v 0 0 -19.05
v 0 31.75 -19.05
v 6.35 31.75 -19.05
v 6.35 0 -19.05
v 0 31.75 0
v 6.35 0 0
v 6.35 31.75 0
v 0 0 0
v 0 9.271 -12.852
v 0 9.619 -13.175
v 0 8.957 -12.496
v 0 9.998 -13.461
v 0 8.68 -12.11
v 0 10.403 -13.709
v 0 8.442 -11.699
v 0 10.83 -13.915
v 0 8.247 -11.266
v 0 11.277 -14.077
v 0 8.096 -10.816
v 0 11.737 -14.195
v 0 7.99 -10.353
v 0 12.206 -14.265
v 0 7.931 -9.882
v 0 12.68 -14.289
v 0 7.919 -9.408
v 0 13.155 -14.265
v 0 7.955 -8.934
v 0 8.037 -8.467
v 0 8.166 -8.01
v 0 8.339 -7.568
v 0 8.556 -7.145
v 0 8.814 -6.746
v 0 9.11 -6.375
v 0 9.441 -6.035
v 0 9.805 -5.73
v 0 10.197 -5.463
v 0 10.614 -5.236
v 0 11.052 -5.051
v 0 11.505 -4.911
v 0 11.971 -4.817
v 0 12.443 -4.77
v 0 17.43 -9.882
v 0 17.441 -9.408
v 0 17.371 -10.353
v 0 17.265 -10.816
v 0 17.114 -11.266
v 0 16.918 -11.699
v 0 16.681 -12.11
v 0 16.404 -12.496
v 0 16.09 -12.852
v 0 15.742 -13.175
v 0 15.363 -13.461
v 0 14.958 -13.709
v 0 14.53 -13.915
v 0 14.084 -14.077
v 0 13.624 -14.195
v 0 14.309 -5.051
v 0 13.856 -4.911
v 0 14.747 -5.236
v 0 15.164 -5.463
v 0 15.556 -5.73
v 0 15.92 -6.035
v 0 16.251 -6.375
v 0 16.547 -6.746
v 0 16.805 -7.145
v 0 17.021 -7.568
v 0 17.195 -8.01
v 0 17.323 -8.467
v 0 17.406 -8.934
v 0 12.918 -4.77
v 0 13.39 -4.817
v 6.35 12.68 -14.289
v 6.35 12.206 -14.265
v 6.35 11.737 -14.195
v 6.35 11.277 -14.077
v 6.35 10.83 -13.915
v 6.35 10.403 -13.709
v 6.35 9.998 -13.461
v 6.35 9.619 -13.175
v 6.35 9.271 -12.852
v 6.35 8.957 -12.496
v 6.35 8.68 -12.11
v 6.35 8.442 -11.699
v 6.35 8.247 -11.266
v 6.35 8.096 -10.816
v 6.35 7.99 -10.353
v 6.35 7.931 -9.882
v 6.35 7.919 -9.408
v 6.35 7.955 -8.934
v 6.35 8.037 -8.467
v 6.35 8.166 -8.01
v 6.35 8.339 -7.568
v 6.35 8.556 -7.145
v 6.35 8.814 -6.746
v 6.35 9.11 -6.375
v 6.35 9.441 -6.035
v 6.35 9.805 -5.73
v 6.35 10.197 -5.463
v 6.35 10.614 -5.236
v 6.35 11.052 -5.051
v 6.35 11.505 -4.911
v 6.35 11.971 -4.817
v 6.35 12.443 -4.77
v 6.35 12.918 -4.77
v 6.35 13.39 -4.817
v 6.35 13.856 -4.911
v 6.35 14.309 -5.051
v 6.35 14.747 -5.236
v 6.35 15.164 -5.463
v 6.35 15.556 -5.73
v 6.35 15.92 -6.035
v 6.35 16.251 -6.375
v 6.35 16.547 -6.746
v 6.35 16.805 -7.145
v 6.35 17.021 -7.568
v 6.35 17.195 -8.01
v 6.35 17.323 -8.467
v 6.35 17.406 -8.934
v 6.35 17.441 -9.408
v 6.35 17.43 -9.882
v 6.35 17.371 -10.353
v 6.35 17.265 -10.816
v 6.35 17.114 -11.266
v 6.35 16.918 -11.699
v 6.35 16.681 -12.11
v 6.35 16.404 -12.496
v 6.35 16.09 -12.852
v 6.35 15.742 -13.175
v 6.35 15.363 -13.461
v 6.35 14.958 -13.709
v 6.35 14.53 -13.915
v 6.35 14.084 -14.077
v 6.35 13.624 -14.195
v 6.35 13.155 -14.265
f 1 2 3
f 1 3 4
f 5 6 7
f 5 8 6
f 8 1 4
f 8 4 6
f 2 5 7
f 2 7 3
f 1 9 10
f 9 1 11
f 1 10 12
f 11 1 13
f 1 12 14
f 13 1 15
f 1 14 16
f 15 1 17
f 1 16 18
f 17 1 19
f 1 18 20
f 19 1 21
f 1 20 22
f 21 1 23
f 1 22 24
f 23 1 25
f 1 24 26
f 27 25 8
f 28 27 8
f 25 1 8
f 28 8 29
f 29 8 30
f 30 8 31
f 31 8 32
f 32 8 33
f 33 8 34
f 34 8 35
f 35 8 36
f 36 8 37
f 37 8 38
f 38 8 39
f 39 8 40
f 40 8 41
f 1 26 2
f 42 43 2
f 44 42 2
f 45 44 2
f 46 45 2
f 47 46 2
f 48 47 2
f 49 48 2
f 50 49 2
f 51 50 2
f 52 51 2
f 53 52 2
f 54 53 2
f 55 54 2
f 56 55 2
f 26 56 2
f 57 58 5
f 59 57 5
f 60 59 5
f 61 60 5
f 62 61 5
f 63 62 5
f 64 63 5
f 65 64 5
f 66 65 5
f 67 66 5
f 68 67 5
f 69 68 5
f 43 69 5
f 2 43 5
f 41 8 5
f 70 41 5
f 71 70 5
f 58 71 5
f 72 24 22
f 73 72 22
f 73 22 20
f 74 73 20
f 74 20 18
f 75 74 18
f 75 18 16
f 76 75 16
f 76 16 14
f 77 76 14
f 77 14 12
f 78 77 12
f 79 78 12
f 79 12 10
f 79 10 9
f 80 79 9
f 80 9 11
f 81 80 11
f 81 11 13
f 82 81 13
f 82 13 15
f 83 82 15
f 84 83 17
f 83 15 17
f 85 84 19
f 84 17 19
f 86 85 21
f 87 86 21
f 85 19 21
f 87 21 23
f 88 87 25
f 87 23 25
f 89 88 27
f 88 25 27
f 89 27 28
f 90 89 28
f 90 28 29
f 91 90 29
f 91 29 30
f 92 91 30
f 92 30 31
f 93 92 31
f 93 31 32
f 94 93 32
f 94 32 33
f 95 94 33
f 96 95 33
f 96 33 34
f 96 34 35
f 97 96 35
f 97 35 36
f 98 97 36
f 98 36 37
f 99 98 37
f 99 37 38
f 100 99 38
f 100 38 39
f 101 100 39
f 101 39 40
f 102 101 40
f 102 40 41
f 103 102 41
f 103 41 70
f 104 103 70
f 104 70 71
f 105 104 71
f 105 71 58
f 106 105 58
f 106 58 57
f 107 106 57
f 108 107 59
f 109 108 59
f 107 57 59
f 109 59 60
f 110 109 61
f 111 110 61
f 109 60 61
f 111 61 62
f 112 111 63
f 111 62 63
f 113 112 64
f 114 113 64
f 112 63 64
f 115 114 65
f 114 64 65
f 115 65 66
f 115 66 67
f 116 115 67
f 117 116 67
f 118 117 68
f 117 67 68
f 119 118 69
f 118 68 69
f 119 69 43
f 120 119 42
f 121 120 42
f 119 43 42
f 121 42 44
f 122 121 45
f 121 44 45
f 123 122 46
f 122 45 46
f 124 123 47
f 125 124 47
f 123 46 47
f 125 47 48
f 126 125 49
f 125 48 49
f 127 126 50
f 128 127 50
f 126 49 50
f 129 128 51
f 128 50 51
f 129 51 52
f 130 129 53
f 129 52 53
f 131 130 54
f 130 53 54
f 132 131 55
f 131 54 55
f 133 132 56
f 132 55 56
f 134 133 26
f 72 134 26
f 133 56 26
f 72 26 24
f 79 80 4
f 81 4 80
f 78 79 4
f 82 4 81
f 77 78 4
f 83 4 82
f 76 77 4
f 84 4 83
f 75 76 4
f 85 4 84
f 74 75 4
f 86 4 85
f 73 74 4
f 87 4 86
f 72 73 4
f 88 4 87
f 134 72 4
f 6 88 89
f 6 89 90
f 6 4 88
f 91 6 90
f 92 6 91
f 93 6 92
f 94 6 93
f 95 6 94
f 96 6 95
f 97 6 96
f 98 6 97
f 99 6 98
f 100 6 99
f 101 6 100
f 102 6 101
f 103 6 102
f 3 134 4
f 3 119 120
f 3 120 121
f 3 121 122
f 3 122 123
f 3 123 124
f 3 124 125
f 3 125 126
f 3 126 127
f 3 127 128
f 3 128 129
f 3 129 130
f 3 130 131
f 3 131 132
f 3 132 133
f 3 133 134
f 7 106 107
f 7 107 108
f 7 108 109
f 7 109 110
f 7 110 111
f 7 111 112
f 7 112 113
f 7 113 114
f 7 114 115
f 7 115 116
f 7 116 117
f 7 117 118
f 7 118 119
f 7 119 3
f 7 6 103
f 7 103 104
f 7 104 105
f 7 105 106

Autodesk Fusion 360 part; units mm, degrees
sketch "Sketch1" plane through (0, 0, 0) normal (1, 0, 0) x (0, 1, 0)
  line L0 (0, 0) -> (31.75, 0)
  line L1 (31.75, 0) -> (31.75, -19.05)
  line L2 (31.75, -19.05) -> (0, -19.05)
  line L3 (0, -19.05) -> (0, 0)
  dimension "d1" = 31.75
  dimension "d2" = 19.05
extrude "Extrude1" add sketch "Sketch1" along normal blind 6.35
sketch "Sketch2" plane through (6.35, 0, 0) normal (1, 0, 0) x (0, 1, 0)
  line L0 (0, -19.05) -> (31.75, -19.05)
  line L1 (31.75, -19.05) -> (31.75, 0)
  line L2 (31.75, 0) -> (0, 0)
  line L3 (0, 0) -> (0, -19.05)
sketch "Sketch3" plane through (6.35, 15.875, -9.525) normal (1, 0, 0) x (0, 1, 0)
  line L0 (15.5884, -0.1633) -> (9.2384, -0.1633)
  line L1 (-15.8946, -0.0015) -> (-3.1946, -0.0015)
  circle A0 centre (-3.1946, -0.0015) radius 4.7625
  dimension "d9" = 6.35
  dimension "d10" = 12.7
  dimension "d11" = 9.525
hole "Hole3" at (6.35, 12.6804, -9.5265) direction (-1, 0, 0) diameter 9.525 depth 50.8 tip angle 118
